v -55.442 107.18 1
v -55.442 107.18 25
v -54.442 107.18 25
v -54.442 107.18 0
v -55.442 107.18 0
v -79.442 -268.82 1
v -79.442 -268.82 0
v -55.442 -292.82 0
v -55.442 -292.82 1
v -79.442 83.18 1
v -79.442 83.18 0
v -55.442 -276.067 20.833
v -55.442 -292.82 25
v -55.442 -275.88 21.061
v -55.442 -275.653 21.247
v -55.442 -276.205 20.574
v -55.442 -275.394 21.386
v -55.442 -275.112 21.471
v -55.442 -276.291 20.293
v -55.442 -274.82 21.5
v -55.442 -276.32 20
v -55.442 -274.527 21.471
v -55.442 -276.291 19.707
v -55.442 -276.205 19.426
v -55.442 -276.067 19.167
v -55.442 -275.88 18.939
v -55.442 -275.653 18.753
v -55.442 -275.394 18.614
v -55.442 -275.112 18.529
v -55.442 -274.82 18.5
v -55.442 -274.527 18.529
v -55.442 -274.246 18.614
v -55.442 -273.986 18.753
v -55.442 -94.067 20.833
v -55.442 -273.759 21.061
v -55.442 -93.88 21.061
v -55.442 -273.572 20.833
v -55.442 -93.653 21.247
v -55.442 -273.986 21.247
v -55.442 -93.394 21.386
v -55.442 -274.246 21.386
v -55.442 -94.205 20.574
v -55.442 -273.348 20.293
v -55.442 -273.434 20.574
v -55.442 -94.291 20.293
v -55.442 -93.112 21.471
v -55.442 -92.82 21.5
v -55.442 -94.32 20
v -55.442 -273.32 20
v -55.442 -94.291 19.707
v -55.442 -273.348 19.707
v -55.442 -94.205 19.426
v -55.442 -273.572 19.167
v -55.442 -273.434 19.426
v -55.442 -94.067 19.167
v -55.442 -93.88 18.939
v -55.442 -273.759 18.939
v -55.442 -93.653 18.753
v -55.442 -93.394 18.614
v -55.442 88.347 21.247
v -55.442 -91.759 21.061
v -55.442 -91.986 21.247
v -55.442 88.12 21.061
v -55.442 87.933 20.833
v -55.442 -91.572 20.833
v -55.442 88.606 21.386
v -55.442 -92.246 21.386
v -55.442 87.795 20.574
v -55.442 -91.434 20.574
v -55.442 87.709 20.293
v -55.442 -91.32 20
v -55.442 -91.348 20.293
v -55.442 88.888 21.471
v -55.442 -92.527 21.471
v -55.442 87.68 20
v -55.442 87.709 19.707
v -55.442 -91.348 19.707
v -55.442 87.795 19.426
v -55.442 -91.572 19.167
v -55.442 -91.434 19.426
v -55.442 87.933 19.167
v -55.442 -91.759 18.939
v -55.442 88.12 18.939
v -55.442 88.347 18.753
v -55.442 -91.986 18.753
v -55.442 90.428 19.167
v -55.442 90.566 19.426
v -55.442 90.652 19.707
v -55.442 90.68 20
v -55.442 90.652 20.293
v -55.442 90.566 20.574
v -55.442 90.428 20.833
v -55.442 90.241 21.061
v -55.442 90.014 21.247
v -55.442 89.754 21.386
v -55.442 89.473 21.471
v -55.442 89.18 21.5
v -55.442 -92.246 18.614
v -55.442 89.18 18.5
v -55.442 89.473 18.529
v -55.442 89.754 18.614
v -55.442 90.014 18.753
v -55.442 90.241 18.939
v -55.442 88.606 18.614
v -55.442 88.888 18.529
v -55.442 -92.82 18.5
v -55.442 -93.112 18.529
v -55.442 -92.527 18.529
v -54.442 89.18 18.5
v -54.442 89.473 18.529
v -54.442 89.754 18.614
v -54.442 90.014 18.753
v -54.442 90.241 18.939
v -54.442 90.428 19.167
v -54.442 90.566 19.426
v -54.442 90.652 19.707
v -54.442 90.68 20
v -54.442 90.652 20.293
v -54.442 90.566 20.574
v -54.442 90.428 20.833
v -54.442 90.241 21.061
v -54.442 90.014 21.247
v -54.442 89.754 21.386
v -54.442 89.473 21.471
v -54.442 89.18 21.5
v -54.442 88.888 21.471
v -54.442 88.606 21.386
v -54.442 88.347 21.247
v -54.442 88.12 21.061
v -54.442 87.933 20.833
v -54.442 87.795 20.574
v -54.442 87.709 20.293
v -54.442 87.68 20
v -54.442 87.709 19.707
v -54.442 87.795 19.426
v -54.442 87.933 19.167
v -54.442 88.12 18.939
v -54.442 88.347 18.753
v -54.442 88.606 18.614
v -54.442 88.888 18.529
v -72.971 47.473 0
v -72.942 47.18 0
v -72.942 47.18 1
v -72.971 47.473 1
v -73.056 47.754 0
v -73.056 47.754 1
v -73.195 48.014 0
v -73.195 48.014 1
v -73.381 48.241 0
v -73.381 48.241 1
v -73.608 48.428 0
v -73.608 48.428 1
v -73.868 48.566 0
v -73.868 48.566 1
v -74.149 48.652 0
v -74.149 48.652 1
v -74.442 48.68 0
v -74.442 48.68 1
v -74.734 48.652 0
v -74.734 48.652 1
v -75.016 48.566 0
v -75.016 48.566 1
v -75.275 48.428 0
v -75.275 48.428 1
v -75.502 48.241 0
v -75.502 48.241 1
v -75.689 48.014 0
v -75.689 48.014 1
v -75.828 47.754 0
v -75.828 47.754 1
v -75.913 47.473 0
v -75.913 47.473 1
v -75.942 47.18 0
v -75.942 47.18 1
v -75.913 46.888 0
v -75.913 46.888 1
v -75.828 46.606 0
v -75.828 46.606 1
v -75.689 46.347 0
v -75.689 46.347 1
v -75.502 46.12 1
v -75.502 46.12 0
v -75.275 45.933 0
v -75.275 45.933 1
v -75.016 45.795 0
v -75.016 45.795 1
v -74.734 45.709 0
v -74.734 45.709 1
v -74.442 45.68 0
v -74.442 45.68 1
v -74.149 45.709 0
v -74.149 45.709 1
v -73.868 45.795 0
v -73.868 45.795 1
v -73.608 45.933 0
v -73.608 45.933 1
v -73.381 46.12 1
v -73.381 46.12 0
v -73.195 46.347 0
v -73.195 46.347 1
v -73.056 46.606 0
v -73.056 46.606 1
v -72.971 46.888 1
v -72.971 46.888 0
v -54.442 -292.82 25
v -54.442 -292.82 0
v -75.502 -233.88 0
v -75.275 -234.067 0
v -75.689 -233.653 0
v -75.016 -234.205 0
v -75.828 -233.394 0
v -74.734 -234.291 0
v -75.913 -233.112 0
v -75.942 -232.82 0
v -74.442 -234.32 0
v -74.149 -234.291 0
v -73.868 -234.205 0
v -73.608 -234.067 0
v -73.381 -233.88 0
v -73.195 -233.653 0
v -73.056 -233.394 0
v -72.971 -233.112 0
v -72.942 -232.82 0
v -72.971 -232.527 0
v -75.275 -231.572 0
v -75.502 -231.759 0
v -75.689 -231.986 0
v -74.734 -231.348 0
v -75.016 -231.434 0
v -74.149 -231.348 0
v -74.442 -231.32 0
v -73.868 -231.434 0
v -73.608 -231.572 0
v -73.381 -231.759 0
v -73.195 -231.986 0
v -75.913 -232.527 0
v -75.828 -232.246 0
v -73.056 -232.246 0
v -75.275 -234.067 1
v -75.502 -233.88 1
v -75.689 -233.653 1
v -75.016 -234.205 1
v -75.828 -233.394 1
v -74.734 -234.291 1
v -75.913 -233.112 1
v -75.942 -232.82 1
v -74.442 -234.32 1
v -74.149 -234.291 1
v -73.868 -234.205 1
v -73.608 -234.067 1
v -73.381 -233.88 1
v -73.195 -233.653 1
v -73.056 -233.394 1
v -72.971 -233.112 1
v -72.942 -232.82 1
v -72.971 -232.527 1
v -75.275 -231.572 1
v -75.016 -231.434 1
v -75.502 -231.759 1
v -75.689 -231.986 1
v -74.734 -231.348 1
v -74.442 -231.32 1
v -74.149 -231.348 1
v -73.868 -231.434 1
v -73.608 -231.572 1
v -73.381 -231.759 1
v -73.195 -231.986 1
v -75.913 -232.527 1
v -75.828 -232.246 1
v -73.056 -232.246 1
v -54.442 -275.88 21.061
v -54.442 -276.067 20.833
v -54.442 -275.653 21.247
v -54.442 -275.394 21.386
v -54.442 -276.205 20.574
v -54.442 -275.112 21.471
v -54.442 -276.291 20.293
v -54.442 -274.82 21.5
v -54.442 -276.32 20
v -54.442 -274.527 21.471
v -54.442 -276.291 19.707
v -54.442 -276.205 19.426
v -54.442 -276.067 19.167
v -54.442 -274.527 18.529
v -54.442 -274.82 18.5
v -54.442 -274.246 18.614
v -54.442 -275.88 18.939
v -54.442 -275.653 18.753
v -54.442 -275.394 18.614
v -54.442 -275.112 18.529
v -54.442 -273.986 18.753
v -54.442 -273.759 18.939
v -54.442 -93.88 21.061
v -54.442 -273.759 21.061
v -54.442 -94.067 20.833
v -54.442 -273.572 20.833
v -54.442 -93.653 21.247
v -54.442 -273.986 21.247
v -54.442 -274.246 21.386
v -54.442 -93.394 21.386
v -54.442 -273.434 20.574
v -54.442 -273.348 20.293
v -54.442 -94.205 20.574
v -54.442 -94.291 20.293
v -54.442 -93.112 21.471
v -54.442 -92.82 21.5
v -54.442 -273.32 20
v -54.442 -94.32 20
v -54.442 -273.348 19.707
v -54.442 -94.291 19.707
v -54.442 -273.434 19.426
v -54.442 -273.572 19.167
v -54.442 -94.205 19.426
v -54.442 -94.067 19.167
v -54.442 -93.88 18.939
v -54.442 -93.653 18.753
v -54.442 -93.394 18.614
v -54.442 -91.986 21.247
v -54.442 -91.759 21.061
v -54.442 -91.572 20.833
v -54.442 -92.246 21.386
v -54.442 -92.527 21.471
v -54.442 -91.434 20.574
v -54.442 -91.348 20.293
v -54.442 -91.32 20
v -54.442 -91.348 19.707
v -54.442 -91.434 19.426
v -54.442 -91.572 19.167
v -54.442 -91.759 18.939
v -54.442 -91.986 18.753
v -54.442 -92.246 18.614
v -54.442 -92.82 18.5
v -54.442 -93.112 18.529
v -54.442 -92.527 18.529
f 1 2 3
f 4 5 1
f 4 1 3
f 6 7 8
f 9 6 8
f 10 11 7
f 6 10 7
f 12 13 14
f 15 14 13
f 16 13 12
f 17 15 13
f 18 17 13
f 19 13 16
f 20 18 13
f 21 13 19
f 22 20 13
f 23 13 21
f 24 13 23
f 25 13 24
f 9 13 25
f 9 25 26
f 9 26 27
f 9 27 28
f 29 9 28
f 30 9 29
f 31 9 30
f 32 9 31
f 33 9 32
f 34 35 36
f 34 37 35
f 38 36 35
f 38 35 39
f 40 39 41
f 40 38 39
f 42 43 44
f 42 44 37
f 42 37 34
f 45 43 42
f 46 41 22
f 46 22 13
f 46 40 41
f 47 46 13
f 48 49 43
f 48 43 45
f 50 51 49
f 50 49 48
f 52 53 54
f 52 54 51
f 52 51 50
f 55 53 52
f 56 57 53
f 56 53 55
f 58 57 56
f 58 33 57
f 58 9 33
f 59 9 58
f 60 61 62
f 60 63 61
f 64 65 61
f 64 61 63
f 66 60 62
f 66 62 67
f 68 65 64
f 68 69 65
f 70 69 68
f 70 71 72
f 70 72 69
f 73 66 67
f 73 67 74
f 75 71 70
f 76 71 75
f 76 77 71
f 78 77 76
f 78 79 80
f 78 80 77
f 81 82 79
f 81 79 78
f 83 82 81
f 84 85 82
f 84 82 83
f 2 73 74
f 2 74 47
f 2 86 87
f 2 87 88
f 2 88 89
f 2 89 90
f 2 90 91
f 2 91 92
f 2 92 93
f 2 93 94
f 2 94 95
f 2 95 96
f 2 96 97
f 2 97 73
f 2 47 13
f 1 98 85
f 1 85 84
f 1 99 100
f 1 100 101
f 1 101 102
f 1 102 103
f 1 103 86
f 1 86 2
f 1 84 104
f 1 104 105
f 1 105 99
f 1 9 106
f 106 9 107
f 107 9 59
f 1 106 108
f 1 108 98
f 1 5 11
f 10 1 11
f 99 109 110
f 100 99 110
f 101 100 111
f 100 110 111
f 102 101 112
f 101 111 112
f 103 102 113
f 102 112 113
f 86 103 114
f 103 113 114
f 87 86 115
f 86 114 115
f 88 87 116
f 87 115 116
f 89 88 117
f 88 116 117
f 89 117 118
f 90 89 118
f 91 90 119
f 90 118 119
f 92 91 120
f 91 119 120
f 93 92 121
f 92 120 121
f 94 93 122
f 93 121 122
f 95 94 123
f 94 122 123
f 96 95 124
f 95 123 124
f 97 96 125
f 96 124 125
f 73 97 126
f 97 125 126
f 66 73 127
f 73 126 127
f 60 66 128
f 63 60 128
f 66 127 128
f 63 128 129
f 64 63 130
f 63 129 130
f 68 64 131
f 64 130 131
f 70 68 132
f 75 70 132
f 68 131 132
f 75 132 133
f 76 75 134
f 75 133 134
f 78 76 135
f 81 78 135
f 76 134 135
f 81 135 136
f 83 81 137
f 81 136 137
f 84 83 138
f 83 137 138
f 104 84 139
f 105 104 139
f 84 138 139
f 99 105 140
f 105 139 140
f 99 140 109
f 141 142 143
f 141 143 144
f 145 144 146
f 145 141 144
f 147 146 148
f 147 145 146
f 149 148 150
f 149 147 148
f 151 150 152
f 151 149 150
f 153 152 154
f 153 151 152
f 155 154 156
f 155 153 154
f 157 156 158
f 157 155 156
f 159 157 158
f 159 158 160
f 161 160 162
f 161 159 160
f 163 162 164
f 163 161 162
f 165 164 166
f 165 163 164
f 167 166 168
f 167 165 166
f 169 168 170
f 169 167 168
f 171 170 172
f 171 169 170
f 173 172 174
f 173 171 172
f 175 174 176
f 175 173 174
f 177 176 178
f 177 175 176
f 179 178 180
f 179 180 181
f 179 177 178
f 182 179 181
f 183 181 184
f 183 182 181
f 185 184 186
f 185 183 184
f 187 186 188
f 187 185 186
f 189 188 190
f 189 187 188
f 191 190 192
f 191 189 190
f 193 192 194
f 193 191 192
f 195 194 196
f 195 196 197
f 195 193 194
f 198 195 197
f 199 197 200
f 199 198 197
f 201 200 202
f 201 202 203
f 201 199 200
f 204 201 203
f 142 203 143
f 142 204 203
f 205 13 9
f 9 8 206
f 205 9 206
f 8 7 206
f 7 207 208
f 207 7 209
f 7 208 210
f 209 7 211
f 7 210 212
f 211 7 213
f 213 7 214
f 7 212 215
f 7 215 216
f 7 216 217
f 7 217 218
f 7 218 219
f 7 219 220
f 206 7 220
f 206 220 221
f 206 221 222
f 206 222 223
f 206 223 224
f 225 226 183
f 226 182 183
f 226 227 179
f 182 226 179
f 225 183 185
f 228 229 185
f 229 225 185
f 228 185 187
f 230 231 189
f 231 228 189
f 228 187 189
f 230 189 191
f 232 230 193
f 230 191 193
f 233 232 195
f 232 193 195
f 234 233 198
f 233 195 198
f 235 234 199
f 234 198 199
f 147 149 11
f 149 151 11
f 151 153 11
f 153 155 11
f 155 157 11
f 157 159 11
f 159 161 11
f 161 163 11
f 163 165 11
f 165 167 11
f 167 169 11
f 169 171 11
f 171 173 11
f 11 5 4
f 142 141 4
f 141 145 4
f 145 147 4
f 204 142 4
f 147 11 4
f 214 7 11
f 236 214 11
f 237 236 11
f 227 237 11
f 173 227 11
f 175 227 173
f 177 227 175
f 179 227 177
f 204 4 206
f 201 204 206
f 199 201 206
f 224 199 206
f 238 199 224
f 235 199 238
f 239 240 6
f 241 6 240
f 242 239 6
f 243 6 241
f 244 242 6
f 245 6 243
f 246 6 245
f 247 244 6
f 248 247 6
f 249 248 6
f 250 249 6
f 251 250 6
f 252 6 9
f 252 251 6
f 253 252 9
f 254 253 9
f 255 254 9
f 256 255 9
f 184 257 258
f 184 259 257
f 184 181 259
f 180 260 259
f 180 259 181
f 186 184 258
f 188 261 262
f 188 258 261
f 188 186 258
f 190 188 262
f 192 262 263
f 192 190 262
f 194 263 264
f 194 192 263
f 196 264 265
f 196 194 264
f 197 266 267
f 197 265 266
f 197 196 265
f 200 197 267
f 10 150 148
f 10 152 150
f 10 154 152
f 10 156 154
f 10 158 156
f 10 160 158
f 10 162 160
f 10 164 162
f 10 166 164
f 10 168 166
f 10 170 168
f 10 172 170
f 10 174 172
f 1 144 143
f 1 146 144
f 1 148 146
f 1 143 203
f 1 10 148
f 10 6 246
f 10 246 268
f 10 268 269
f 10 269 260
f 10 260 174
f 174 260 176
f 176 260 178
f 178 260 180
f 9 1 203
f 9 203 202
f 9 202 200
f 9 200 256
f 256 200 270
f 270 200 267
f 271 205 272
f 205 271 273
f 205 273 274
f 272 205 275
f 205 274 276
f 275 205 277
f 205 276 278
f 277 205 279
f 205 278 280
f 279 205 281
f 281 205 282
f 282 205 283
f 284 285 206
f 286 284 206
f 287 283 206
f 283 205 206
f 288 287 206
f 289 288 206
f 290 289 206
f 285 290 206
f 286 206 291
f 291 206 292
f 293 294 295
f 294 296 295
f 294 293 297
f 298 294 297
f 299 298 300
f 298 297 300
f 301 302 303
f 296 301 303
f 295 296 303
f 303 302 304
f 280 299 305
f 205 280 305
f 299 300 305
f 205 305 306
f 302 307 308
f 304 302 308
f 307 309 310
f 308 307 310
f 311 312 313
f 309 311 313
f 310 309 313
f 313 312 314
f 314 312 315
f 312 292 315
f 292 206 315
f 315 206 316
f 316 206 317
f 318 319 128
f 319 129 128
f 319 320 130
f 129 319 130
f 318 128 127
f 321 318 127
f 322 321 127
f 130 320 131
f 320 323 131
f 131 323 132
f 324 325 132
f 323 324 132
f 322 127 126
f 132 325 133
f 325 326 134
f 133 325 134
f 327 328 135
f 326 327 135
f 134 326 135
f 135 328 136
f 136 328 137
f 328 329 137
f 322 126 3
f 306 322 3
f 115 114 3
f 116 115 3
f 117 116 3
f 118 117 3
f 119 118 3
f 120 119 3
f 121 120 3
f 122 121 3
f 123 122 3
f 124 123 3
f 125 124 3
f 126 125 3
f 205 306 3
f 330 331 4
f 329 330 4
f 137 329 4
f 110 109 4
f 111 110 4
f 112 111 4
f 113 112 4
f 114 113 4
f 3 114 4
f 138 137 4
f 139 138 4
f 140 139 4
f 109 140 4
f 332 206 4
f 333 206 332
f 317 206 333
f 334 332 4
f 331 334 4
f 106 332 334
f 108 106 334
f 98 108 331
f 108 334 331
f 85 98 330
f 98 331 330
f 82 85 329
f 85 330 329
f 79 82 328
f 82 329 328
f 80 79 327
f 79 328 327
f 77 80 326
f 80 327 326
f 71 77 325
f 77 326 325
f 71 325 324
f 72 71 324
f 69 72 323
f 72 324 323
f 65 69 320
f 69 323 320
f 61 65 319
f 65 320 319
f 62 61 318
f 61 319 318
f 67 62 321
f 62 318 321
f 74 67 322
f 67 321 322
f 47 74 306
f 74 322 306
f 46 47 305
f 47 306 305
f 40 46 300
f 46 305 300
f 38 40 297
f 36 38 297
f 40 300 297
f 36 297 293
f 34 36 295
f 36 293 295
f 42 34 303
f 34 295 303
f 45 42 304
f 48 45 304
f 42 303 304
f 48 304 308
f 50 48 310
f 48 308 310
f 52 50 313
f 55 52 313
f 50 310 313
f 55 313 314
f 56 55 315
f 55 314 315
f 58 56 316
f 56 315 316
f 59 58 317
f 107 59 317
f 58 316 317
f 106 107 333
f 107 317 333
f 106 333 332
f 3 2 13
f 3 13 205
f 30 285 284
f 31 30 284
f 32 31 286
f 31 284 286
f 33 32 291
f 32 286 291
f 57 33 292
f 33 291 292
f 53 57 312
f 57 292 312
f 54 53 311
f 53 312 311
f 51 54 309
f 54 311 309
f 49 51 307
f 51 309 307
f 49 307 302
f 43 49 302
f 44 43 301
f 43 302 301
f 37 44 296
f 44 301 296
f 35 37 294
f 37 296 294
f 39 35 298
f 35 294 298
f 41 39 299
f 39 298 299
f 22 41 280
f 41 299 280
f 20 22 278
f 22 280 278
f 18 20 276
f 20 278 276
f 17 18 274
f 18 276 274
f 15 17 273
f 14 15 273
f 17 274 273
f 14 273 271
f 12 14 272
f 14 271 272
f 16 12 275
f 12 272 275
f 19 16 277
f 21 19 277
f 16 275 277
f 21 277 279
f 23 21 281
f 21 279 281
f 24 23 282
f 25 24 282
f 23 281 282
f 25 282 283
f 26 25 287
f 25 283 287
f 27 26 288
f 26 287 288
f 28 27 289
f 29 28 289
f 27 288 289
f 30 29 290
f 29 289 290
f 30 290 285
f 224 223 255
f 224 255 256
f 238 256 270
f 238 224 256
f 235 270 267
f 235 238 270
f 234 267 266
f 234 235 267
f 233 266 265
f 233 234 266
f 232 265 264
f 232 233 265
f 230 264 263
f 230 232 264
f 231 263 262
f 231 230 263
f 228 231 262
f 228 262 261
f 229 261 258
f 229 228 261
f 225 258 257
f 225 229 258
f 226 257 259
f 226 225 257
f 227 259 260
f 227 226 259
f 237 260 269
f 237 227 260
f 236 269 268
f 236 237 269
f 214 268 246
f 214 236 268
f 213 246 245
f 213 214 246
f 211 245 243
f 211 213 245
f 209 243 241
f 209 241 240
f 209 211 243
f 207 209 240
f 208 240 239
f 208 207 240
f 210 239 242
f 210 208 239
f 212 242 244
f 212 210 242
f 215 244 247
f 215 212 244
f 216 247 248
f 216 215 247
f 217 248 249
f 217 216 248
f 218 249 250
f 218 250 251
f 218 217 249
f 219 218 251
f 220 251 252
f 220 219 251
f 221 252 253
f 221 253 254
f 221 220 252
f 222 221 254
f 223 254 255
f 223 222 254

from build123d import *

# Parameters (mm, degrees)
CROQUIS2_W              = 1
CROQUIS2_H              = 400
SALIENTE_EXTRUIR2_DEPTH = 25
CROQUIS5_R              = 1.5
CORTAR_EXTRUIR2_DEPTH   = 1
CROQUIS1_R              = 1.5
SALIENTE_EXTRUIR3_DEPTH = 1


with BuildPart() as part:
    # Croquis2 → Saliente-Extruir2 (new body)
    with BuildSketch(Plane.XY):
        with Locations((-54.941785307, -92.819624774)):
            Rectangle(CROQUIS2_W, CROQUIS2_H)
    extrude(amount=SALIENTE_EXTRUIR2_DEPTH)

    # Croquis5 → Cortar-Extruir2 (cut)
    with BuildSketch(Plane(origin=(-54.441785307, 0, 0), x_dir=(0, 0, -1), z_dir=(1, 0, 0))):
        with Locations((-20, 89.180375226)):
            Circle(CROQUIS5_R)
        with Locations((-20, -274.819624774)):
            Circle(CROQUIS5_R)
        with Locations((-20, -92.819624774)):
            Circle(CROQUIS5_R)
    extrude(amount=-CORTAR_EXTRUIR2_DEPTH, mode=Mode.SUBTRACT)

    # Croquis1 → Saliente-Extruir3 (add)
    with BuildSketch(Plane.XY):
        Polygon((-79.441785307, 83.180375226), (-79.441785307, -268.819624774), (-55.441785307, -292.819624774), (-55.441785307, 107.180375226), align=None)
        with Locations((-74.441785307, 47.180375226)):
            Circle(CROQUIS1_R, mode=Mode.SUBTRACT)
        with Locations((-74.441785307, -232.819624774)):
            Circle(CROQUIS1_R, mode=Mode.SUBTRACT)
    extrude(amount=SALIENTE_EXTRUIR3_DEPTH)


solid = part.part
